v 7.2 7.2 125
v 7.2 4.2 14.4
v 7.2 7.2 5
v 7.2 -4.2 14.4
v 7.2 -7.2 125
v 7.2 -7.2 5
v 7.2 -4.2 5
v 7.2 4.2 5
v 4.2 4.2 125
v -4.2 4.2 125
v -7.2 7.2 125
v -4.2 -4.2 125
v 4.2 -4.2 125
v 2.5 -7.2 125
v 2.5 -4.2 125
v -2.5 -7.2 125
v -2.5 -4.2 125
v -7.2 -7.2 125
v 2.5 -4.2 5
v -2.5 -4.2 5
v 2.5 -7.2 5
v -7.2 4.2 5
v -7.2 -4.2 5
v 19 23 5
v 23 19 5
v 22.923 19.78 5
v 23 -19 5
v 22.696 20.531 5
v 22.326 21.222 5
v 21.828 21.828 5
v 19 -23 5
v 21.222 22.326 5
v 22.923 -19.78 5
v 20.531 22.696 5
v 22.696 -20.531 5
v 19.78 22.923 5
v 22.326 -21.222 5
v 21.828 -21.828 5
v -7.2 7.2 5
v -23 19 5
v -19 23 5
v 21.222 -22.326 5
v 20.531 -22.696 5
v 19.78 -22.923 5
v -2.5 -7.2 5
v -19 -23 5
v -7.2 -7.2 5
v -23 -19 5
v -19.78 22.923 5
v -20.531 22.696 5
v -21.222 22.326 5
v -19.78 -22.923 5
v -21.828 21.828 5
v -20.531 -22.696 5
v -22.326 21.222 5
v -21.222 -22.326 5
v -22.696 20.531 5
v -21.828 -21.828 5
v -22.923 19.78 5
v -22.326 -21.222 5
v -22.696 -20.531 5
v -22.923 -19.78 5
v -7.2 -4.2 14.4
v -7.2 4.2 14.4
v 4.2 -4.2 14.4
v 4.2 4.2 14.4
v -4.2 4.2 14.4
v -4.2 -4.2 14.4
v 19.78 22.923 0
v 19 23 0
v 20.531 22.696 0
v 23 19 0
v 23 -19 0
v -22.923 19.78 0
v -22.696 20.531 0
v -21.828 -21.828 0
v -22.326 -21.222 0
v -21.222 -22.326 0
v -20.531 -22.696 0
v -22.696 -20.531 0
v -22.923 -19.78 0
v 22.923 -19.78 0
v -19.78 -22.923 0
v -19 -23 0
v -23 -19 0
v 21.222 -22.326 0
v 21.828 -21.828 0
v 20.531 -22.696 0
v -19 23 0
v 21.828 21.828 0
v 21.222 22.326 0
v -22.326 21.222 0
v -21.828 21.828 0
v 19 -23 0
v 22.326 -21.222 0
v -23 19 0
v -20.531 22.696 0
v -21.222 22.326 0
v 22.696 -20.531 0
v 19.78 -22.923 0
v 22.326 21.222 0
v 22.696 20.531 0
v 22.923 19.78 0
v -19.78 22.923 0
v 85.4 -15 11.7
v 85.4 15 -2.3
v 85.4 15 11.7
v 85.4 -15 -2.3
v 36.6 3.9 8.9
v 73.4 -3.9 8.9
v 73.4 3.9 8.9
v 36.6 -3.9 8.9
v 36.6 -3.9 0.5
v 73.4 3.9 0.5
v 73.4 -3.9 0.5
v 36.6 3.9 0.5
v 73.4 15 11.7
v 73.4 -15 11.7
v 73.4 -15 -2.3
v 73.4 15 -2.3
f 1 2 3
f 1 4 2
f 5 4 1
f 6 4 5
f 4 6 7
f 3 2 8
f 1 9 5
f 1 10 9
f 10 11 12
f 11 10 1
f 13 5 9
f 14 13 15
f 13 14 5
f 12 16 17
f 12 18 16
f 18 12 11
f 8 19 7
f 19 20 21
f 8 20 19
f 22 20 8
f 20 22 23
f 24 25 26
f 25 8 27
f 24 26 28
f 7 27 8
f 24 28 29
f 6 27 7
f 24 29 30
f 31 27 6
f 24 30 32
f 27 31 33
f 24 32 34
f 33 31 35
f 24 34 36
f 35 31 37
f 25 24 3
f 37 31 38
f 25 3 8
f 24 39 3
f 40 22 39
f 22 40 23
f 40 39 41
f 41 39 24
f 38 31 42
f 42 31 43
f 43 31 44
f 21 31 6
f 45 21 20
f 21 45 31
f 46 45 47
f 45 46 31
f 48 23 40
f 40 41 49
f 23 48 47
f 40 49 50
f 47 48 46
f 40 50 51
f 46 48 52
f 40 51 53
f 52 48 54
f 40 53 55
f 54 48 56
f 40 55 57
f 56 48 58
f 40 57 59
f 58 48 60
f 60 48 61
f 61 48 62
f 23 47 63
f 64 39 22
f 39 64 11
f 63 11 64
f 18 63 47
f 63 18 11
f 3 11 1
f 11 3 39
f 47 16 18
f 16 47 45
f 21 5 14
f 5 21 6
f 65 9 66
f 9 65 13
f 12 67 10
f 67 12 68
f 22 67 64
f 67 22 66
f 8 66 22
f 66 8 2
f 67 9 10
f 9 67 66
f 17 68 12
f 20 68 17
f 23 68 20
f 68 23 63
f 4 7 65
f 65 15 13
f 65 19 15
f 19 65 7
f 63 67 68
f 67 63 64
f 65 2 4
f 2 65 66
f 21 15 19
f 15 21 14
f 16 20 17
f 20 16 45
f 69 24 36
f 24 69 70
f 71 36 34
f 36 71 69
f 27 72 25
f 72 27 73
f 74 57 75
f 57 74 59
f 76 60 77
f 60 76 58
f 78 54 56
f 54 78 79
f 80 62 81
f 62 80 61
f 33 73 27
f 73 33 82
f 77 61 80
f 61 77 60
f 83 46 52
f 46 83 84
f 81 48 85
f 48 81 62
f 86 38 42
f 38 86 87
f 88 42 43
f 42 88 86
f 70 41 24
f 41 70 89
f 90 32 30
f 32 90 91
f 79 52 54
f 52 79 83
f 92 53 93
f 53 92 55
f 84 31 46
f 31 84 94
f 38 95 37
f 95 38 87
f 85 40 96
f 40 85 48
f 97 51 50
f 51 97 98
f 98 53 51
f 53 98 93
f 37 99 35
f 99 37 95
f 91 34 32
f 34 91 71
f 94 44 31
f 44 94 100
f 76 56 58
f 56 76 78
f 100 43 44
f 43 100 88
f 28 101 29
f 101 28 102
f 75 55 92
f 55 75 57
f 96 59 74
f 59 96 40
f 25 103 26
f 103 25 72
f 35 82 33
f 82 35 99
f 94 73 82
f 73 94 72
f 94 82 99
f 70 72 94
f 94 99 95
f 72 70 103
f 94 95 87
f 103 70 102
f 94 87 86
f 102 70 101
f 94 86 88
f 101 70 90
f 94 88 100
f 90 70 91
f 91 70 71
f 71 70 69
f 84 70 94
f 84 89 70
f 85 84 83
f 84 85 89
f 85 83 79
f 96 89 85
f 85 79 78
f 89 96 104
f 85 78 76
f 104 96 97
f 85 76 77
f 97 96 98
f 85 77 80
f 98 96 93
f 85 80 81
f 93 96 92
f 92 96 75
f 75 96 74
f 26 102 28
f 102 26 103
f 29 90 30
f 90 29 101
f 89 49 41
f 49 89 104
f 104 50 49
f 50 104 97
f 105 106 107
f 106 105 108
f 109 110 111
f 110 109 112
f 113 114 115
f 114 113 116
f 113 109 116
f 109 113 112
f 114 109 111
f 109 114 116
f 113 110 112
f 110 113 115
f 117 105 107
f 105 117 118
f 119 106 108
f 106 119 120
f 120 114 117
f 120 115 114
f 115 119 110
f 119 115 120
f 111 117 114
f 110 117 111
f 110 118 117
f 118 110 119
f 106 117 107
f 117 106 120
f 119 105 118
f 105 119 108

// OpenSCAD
// ============================================
// Pontos do Medo — Torre de Cubos
// Diablo RPG | Paulo Souza
// ============================================
// Para cubinhos de 8mm (cristal acrílico roxo)
// Capacidade: 15 cubos (~120mm de coluna)
//
// Como usar:
//   - Coloque cubos pelo topo
//   - Para remover: empurre o cubo de baixo
//     pelo lado esquerdo — ele sai pela direita
//   - O peso da pilha mantém os outros no lugar
// ============================================

// --- Parâmetros ---
cube_size  = 8;    // lado do cubinho (mm)
tolerance  = 0.4;  // folga para impressão
wall       = 3;    // espessura da parede da coluna
base_w     = 46;   // largura da base
base_thick = 5;    // espessura da base
max_cubes  = 15;   // capacidade da torre
corner_r   = 4;    // raio dos cantos da base
window_pct = 0.5;  // largura da janela frontal (fração do canal)

// --- Calculados ---
ch    = cube_size + tolerance;
co    = ch + wall * 2;
col_h = cube_size * max_cubes;
win_w = ch * window_pct;

// Slot lateral: altura de 1 cubo + folga, largura total do canal
slot_h = cube_size + tolerance + 1;

// ============================================
// Base
// ============================================
module base() {
    hull()
        for (x = [-1, 1], y = [-1, 1])
            translate([x * (base_w/2 - corner_r), y * (base_w/2 - corner_r), 0])
                cylinder(r = corner_r, h = base_thick, $fn = 32);
}

// ============================================
// Coluna dispensadora
// ============================================
module column() {
    translate([0, 0, base_thick])
    difference() {
        // Corpo externo
        translate([-co/2, -co/2, 0])
            cube([co, co, col_h]);

        // Canal interno — cubos entram pelo topo
        translate([-ch/2, -ch/2, -1])
            cube([ch, ch, col_h + 2]);

        // Slot lateral esquerdo — dedo entra aqui para empurrar
        translate([-co/2 - 1, -ch/2, 0])
            cube([wall + 2, ch, slot_h]);

        // Slot lateral direito — cubo sai por aqui
        translate([co/2 - wall - 1, -ch/2, 0])
            cube([wall + 2, ch, slot_h]);

        // Janela frontal estreita — cubos visíveis mas não caem (janela < cubo)
        win_w = 5;  // menor que cube_size (8mm), cubos ficam retidos
        translate([-win_w/2, -co/2 - 1, -1])
            cube([win_w, wall + 2, col_h + 2]);
    }
}

// ============================================
// Empurrador de cubos
// Ponta: cabe no slot lateral (8.4 x 9.4mm)
// Cabo: largo para dedos grandes
// ============================================
module pusher() {
    ponta_w = ch - 0.6;   // largura da haste (cabe no slot)
    ponta_h = slot_h - 1; // altura da haste (cabe no slot)
    ponta_l = co * 2 + 20; // comprimento da haste (atravessa a torre com folga)
    cabo_w  = 30;          // comprimento da barra do T (pegador)
    cabo_h  = 14;         // altura da barra
    cabo_d  = 12;         // espessura da barra

    // Haste
    cube([ponta_l, ponta_w, ponta_h], center = true);

    // Barra do T — centrada na extremidade da haste
    translate([ponta_l/2 - cabo_d/2, 0, 0])
        cube([cabo_d, cabo_w, cabo_h], center = true);
}

// ============================================
// Montagem — torre + empurrador lado a lado
// ============================================
union() {
    base();
    column();
}

// Empurrador posicionado ao lado da torre para imprimir junto
translate([base_w + 15, 0, slot_h / 2])
    pusher();
